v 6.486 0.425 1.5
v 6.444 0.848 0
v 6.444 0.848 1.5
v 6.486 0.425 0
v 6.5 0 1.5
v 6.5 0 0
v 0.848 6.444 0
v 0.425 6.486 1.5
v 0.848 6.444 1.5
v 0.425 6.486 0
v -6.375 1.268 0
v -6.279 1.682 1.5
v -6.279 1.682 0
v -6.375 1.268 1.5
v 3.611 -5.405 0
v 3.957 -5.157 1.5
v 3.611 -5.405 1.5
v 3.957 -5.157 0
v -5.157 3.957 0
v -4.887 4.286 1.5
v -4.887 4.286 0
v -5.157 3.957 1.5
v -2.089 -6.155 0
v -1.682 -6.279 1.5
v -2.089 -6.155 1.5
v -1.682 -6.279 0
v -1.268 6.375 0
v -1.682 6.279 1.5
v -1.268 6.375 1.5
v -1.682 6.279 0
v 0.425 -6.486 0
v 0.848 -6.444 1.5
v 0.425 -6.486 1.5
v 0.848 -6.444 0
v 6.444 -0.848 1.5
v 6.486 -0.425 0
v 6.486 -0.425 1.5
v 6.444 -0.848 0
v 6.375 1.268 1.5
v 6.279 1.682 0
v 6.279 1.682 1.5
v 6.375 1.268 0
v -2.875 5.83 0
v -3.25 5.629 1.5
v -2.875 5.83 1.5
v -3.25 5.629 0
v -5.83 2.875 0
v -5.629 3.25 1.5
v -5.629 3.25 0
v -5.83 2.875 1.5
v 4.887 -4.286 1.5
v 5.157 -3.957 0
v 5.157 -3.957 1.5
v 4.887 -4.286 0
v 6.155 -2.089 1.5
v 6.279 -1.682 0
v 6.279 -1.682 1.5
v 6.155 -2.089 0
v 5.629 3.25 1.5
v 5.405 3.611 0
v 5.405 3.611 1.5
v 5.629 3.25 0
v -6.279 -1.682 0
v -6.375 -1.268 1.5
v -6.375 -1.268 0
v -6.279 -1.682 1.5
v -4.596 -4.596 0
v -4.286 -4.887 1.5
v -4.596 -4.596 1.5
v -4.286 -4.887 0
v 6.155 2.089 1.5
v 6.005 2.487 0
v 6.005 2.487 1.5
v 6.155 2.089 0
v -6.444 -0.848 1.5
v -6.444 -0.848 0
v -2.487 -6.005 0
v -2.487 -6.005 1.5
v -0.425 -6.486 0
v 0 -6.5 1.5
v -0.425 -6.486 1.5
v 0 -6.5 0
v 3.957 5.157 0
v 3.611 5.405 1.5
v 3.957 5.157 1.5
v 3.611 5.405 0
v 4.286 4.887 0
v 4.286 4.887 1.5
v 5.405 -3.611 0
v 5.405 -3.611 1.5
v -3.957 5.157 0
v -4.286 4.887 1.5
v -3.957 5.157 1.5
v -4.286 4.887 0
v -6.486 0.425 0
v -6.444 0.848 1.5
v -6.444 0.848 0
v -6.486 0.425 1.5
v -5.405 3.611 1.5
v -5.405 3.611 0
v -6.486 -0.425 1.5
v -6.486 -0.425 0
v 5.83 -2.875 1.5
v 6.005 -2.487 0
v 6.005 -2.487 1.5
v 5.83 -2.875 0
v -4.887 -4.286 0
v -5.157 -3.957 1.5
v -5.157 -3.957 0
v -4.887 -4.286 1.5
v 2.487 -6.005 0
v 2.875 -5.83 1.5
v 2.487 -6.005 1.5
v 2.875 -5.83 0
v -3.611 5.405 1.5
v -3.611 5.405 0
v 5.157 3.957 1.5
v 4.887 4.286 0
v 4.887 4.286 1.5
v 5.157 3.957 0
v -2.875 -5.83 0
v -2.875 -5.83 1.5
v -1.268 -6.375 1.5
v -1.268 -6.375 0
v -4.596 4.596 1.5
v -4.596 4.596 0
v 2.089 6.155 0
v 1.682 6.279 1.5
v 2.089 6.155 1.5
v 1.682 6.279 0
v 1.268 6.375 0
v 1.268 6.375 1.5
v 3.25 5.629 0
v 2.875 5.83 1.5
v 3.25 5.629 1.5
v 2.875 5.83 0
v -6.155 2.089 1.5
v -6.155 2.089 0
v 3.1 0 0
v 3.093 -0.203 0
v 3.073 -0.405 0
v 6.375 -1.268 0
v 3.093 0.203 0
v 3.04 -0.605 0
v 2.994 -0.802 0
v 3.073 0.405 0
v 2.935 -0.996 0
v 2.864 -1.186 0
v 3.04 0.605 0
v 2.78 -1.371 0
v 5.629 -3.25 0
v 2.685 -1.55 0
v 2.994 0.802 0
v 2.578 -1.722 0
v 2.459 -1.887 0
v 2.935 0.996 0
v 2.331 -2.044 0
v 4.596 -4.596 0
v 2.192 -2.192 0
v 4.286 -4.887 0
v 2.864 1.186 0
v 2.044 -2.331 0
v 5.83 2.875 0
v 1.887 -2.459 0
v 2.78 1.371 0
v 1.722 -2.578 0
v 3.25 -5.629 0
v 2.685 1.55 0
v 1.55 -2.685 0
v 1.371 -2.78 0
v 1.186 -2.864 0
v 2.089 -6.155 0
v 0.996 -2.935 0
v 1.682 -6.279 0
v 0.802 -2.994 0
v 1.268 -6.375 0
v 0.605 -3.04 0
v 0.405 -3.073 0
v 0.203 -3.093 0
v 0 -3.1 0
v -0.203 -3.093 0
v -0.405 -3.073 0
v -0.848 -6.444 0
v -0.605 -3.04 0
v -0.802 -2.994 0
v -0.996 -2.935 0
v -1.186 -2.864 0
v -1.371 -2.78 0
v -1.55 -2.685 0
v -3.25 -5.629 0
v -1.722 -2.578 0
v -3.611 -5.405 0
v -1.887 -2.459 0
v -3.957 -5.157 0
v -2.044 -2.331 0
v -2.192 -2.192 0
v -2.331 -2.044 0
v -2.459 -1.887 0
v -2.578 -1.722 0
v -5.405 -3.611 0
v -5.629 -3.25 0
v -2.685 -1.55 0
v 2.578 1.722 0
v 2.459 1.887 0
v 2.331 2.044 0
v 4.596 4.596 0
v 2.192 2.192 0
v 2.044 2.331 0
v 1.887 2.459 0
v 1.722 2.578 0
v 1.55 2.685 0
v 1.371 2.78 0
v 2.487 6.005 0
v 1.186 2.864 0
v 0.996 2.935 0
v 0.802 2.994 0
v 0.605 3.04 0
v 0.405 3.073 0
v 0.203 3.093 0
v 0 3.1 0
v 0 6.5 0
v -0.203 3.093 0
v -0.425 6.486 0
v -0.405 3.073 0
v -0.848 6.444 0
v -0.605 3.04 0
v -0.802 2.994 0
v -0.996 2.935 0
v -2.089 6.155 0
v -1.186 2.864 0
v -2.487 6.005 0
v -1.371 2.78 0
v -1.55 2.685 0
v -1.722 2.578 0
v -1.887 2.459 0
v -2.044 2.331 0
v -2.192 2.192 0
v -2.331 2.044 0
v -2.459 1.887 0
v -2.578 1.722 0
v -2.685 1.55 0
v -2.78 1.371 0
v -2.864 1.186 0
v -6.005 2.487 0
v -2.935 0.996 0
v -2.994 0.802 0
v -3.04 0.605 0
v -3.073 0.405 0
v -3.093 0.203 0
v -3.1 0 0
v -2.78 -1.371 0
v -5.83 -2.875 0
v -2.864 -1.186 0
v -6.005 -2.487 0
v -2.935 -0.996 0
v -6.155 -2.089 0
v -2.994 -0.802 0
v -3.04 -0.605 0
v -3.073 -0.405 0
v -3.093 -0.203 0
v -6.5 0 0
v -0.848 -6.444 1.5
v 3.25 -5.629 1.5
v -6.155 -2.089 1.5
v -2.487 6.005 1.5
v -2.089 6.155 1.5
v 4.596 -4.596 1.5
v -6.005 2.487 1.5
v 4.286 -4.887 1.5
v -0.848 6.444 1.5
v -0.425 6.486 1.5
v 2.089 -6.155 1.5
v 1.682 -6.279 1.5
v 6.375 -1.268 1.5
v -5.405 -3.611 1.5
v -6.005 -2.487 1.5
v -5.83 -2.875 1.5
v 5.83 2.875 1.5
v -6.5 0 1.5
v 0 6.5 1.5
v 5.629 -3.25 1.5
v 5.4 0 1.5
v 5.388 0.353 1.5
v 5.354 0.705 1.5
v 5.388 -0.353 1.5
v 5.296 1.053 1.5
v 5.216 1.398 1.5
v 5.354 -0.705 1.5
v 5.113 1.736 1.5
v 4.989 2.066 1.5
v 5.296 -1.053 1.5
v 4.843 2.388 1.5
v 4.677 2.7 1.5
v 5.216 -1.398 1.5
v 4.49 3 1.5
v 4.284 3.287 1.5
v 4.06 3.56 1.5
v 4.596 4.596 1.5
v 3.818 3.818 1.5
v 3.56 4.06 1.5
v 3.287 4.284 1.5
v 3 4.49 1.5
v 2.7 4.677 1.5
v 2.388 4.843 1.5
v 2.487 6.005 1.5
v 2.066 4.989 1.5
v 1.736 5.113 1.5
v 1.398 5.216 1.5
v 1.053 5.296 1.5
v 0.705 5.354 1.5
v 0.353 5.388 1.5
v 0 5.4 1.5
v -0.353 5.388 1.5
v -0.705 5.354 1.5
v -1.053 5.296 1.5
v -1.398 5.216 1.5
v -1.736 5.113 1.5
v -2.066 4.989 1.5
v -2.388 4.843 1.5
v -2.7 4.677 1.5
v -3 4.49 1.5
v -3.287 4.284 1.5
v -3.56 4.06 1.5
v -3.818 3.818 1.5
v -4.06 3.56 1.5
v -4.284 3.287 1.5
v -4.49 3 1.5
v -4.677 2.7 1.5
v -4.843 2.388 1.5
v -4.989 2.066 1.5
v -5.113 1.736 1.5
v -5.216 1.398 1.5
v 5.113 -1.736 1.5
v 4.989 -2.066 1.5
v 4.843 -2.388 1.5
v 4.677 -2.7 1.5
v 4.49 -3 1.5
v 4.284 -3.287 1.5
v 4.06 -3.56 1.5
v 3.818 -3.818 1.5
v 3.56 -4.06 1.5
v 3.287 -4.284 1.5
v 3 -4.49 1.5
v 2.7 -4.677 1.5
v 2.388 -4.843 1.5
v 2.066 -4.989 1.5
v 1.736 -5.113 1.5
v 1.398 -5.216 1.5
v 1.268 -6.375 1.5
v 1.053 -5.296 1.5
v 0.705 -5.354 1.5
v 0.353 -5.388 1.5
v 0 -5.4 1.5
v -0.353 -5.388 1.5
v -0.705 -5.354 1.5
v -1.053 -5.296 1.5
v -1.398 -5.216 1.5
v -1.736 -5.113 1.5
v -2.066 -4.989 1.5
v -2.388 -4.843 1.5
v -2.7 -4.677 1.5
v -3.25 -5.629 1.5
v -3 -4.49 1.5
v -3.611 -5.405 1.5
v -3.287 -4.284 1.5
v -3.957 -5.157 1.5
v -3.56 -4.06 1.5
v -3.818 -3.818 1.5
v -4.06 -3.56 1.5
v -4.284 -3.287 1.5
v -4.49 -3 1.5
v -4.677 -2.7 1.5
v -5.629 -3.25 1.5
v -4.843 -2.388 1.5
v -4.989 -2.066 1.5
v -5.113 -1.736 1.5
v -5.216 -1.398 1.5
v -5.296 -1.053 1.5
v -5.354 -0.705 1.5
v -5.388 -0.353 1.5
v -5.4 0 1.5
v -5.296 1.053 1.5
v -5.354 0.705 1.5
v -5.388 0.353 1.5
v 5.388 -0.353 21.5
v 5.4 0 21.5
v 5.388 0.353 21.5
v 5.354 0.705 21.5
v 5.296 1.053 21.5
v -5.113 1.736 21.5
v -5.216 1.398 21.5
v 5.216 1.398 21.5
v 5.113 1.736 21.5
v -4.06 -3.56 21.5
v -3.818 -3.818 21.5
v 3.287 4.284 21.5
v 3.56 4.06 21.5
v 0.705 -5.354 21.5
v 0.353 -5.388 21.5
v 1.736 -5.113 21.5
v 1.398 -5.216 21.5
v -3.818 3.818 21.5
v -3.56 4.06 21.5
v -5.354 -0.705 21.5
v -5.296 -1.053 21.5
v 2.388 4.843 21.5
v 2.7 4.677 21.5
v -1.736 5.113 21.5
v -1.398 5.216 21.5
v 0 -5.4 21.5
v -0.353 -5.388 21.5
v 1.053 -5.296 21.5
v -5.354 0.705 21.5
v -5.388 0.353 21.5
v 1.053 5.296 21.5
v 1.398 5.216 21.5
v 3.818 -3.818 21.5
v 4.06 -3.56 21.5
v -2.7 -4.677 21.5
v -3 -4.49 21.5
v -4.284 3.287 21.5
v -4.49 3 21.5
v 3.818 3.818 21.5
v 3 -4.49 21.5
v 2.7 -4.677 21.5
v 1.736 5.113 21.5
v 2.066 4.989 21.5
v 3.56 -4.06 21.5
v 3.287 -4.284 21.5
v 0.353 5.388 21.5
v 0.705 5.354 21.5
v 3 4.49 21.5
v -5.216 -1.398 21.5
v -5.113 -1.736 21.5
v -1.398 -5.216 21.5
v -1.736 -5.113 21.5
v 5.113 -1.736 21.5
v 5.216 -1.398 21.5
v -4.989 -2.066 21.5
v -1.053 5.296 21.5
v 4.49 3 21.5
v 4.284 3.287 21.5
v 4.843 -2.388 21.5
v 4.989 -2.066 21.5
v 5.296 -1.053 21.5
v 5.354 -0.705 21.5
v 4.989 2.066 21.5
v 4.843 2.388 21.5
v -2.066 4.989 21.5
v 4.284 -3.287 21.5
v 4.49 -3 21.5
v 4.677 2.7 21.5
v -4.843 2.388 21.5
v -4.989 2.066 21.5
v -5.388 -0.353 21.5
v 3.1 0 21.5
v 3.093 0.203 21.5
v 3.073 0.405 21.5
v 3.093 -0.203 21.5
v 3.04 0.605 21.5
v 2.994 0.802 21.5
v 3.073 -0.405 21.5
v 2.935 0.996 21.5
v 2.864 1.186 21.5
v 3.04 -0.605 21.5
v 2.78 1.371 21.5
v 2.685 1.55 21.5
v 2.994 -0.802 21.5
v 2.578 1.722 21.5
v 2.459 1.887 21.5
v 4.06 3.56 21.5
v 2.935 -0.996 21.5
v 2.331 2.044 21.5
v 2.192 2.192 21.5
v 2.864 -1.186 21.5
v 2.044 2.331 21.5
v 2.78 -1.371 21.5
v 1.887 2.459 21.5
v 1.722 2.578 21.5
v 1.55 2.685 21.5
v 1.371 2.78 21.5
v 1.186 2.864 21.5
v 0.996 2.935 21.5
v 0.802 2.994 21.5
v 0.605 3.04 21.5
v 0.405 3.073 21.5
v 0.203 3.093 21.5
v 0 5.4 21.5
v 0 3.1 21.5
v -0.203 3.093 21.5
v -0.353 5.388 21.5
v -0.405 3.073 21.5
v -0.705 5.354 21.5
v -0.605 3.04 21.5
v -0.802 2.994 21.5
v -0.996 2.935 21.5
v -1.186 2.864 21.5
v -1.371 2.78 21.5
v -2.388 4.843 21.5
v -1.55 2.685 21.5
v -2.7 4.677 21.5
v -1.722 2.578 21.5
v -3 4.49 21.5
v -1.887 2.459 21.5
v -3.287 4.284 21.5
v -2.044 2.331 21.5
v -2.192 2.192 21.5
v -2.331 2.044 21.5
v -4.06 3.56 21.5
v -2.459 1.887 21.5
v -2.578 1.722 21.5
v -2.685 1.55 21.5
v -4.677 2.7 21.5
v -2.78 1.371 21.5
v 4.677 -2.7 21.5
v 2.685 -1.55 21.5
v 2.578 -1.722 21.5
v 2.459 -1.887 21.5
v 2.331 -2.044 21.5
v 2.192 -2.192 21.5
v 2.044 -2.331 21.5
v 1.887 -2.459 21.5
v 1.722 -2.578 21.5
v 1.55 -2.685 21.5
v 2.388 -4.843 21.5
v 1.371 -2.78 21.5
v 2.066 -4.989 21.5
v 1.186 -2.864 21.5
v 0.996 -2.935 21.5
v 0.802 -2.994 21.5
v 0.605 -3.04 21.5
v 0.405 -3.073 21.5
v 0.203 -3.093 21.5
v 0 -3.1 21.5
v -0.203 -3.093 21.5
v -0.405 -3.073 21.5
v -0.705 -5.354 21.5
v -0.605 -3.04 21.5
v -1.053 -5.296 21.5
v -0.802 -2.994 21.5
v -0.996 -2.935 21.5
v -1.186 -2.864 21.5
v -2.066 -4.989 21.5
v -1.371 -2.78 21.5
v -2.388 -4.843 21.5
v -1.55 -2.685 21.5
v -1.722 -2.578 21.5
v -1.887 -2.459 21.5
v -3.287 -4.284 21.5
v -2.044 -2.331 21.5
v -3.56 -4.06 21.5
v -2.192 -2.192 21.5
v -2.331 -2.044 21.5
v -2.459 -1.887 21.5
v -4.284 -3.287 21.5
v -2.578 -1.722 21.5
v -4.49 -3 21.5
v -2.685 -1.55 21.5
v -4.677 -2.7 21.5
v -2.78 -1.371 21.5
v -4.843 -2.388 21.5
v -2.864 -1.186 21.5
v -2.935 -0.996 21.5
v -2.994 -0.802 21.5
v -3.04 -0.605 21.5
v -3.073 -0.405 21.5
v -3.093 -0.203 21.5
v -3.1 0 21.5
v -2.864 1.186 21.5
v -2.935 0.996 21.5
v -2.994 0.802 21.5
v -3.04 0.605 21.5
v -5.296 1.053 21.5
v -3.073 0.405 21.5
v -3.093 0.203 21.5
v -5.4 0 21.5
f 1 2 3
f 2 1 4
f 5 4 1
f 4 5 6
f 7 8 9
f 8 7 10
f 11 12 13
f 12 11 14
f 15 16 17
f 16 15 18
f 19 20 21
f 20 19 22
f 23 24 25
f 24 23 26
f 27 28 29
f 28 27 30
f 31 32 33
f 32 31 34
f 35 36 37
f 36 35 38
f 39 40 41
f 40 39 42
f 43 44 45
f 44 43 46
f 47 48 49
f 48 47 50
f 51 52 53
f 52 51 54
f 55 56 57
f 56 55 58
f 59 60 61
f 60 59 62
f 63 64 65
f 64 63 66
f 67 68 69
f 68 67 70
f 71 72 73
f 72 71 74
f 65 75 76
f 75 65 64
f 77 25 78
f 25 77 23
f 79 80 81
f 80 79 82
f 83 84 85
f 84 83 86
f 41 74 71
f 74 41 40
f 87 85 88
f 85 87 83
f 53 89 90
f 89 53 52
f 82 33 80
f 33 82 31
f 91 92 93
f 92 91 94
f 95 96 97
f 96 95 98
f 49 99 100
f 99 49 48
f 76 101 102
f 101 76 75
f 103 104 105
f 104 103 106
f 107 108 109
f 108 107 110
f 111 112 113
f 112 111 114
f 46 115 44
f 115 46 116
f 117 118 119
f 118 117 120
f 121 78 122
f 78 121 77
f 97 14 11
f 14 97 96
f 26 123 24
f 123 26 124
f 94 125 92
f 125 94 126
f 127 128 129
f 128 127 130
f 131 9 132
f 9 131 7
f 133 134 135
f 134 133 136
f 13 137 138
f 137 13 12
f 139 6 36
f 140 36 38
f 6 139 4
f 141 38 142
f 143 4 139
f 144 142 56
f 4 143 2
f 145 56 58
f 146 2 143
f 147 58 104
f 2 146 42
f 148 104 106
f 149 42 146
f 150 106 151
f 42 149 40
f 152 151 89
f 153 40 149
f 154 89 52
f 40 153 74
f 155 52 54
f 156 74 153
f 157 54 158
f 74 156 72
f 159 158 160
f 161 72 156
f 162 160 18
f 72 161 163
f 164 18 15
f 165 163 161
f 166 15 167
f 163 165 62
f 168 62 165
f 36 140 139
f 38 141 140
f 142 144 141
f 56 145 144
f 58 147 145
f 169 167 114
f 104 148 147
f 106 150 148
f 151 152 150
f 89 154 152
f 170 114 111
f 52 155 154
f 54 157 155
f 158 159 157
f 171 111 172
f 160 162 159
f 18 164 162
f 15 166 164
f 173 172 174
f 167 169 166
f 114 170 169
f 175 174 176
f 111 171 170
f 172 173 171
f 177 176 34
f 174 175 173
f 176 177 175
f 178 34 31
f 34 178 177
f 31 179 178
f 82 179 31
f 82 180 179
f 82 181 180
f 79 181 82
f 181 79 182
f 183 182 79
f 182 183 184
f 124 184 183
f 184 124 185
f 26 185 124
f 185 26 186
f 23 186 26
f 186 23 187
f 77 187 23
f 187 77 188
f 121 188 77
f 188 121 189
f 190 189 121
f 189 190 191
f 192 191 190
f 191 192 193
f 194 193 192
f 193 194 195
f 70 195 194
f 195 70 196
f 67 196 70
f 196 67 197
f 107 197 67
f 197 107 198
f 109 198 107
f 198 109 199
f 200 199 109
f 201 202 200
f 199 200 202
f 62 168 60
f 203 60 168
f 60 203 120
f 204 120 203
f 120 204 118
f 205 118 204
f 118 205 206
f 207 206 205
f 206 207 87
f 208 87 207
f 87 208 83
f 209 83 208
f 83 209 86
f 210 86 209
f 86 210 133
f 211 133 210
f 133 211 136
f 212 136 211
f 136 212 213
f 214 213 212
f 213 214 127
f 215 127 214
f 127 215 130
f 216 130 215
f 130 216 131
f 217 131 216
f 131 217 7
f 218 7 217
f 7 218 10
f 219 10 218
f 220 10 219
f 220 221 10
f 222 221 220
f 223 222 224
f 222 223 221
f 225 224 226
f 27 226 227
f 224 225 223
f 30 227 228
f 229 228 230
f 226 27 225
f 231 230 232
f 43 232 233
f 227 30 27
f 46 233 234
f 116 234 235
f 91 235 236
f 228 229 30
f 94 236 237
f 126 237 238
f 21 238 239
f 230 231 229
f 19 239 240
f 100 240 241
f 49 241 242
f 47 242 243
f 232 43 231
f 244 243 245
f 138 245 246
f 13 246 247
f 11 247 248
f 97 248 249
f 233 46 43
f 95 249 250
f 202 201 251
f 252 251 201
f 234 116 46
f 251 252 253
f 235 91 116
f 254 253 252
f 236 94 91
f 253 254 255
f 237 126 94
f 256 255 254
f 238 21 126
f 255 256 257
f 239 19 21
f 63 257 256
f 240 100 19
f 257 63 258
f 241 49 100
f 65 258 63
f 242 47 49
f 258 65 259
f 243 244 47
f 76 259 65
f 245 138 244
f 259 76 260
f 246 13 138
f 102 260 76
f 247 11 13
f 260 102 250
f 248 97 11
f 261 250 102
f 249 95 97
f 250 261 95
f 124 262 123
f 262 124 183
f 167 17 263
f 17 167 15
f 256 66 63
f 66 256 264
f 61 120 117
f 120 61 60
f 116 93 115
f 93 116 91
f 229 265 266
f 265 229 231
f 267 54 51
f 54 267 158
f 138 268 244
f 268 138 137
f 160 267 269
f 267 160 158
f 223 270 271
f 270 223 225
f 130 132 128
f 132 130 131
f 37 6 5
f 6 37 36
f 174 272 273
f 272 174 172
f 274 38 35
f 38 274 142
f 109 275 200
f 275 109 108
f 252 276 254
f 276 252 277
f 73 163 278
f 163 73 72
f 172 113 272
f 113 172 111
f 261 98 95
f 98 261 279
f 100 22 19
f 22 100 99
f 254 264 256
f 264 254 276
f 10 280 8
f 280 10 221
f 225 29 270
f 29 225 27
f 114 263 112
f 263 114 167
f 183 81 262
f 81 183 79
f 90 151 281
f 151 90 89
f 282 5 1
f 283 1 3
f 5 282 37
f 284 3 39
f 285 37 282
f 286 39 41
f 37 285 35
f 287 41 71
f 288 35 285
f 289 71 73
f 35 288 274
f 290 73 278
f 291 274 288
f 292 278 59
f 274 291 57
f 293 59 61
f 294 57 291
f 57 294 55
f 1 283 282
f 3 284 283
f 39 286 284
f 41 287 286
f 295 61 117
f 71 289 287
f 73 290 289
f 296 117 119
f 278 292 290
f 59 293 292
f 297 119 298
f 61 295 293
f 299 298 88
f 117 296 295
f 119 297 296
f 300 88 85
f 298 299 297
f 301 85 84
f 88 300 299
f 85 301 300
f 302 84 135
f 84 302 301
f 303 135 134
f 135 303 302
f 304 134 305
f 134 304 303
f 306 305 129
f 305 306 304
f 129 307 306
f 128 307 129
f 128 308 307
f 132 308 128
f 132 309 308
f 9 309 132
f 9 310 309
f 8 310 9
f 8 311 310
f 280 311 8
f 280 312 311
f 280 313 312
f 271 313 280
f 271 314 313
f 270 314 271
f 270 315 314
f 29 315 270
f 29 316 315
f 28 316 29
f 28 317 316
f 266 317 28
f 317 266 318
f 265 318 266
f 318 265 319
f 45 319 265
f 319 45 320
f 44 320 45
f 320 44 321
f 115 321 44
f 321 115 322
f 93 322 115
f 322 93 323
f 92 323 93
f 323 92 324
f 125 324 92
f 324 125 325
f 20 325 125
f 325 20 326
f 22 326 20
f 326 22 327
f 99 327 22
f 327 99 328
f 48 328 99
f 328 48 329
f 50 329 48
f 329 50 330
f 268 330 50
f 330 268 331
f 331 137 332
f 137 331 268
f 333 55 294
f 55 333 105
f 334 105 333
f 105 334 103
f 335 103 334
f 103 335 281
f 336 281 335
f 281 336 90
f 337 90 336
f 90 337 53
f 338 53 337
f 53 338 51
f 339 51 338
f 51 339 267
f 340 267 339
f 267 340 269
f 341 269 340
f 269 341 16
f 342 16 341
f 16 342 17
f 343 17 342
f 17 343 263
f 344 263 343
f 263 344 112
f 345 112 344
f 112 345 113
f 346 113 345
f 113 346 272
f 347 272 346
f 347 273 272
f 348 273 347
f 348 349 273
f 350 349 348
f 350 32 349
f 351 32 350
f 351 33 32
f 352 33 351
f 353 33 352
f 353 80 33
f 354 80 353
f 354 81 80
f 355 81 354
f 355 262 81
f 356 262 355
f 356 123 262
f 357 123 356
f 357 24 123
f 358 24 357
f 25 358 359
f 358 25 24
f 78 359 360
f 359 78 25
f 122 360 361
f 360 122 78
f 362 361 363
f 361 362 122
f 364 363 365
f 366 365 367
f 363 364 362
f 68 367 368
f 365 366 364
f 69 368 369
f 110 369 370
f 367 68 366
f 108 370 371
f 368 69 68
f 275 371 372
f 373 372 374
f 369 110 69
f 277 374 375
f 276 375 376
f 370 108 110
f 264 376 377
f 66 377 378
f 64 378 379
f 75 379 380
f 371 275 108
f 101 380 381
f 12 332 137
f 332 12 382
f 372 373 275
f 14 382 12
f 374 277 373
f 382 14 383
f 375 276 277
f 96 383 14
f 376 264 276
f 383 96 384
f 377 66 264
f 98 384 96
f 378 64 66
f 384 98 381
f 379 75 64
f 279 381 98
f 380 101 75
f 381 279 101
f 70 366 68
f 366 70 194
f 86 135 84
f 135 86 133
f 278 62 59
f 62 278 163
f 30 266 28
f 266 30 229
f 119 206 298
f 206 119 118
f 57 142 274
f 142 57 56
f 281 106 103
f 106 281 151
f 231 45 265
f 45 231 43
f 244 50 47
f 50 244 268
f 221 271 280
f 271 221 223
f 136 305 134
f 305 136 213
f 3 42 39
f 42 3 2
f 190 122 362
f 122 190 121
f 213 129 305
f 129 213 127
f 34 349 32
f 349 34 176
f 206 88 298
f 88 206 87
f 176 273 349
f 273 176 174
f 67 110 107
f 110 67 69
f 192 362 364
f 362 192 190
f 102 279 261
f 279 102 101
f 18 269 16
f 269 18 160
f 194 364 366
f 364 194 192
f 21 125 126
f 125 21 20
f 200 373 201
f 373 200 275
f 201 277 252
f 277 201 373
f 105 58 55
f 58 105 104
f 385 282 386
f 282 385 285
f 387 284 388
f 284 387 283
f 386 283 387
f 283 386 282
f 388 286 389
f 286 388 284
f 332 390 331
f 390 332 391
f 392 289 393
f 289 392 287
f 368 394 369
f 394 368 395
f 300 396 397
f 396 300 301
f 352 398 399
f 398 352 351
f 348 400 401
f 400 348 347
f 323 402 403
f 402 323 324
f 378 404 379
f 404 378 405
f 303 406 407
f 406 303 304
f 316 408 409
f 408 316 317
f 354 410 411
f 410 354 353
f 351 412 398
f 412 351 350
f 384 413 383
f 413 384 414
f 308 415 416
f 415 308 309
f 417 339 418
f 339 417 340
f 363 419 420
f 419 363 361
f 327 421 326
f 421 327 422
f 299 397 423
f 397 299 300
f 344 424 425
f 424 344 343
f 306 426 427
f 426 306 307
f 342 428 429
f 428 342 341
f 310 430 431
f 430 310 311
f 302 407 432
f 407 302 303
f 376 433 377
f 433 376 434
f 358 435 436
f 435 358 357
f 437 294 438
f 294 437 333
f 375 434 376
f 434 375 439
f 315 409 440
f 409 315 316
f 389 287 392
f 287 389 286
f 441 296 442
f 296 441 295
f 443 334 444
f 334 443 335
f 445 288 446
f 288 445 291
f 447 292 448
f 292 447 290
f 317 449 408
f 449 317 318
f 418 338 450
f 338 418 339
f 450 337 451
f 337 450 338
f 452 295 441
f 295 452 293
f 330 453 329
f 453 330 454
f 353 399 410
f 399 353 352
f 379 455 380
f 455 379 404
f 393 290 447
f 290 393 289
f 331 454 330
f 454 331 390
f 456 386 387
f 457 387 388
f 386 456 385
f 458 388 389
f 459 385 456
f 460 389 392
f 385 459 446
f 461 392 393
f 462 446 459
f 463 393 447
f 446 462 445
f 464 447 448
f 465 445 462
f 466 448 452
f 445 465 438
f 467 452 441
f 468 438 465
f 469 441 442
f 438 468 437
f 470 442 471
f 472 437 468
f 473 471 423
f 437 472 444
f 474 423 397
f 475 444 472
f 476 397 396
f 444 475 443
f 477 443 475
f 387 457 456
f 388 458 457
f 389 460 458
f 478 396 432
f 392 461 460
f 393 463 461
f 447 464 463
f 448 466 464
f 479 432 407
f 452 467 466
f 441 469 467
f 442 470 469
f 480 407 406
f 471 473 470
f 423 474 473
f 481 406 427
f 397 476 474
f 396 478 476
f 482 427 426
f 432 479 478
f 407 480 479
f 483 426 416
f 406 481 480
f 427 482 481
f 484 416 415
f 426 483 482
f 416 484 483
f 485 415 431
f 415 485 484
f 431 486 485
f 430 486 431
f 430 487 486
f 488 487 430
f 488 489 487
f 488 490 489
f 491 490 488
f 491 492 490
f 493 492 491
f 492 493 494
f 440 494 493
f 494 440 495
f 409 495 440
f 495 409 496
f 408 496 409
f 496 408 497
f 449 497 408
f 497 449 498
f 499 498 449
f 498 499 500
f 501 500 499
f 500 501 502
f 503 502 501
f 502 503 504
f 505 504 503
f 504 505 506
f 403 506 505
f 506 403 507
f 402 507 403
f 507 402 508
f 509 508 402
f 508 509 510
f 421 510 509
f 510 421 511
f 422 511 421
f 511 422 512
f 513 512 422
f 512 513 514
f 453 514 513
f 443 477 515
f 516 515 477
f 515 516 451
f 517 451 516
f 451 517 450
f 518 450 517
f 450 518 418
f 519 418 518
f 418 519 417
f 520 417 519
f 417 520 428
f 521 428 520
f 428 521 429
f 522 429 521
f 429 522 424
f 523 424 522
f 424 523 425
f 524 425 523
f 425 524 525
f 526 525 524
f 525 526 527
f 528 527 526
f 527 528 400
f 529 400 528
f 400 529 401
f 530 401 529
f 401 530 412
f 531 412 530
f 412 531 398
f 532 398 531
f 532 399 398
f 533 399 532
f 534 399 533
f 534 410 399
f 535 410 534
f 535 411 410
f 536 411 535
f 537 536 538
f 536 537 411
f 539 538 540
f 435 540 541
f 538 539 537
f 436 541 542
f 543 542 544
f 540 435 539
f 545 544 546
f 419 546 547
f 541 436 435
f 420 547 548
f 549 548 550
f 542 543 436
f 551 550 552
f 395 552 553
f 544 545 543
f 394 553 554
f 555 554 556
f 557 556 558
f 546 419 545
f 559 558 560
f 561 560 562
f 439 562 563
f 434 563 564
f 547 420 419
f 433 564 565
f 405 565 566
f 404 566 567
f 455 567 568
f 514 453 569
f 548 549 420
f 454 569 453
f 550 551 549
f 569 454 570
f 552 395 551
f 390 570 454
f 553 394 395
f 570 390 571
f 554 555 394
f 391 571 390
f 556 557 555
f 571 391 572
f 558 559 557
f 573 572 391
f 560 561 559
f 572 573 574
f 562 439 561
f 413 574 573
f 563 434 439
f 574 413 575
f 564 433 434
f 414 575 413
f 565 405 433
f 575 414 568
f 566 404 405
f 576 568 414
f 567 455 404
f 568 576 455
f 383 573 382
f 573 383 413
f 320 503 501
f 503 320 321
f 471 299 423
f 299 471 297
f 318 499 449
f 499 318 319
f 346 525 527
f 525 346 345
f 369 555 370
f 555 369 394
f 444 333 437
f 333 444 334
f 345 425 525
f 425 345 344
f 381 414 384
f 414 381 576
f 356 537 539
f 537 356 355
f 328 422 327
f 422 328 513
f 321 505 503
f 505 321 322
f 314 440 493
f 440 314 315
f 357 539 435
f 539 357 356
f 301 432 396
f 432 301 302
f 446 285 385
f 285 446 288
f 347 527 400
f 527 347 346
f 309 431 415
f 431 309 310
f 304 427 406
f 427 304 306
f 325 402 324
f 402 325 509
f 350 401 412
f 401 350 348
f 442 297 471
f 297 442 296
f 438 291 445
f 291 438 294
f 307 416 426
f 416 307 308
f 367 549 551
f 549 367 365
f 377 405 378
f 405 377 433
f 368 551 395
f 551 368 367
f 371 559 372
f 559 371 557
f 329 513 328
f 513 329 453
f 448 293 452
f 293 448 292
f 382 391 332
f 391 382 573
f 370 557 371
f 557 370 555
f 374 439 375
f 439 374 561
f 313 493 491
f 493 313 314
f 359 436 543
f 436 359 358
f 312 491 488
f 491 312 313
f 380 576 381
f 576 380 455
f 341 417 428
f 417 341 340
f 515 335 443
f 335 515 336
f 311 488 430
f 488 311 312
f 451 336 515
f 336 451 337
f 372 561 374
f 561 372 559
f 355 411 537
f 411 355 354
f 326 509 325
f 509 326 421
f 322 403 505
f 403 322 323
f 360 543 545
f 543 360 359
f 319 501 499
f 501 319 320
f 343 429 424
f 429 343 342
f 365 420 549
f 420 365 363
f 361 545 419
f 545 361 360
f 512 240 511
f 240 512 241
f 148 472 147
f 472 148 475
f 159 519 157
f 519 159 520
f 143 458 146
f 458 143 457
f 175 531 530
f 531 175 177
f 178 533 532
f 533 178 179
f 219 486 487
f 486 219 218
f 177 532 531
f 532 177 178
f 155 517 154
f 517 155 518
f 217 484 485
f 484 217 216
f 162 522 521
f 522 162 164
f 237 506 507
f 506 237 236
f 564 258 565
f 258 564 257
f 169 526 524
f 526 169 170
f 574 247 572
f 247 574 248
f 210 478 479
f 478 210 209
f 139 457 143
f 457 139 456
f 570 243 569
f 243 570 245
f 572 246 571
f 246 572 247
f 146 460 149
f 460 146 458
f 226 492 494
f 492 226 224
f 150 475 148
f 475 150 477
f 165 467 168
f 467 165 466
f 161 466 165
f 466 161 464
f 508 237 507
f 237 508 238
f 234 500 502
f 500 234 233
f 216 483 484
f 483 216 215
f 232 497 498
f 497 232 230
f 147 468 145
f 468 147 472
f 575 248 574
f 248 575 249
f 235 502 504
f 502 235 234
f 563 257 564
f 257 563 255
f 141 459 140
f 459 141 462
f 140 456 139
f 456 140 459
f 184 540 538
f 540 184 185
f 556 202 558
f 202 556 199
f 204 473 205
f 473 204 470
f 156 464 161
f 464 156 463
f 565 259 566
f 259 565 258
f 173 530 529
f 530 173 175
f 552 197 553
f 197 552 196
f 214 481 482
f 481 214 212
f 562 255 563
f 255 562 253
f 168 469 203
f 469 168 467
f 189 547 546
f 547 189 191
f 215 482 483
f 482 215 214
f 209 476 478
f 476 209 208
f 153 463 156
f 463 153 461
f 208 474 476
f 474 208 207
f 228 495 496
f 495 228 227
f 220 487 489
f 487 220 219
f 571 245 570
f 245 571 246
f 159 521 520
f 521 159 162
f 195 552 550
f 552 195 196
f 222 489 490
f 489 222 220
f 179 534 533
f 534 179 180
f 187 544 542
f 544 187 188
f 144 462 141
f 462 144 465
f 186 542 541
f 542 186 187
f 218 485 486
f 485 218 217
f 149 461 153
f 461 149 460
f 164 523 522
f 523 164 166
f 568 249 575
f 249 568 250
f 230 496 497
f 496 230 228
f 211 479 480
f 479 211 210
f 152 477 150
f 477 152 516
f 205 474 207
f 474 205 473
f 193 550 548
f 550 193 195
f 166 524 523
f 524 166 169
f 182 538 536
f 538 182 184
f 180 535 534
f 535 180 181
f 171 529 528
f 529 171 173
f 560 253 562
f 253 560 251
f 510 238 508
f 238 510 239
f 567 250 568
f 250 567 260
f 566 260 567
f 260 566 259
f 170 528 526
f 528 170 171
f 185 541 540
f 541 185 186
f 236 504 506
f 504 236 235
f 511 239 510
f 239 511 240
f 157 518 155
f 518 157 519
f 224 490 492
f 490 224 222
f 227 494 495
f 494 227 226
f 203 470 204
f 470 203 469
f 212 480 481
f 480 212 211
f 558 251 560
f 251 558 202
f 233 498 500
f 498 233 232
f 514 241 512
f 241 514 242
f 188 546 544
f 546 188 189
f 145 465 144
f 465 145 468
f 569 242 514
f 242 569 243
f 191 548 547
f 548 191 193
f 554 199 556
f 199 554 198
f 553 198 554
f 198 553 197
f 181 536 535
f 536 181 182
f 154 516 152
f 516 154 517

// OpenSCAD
// PCR tube adapter sleeve: fits 0.2 mL tubes into 1.5 mL rack holes
// Print orientation: collar on bed (z = 0), sleeve body rises to z = 21.5

// ---------- Parameters ----------
collar_d        = 13;    // collar outer diameter
collar_h        = 1.5;   // collar thickness (z = 0 to 1.5)
sleeve_od       = 10.8;  // sleeve body outer diameter
sleeve_top_z    = 21.5;  // top of sleeve body
bore_d          = 6.2;   // through-bore diameter
eps             = 0.5;   // cutter overshoot past faces

$fn = 96;

// ---------- Model ----------
difference() {
    union() {
        // Collar
        cylinder(d = collar_d, h = collar_h);
        // Sleeve body (overlaps collar slightly for a clean union)
        translate([0, 0, collar_h - 0.01])
            cylinder(d = sleeve_od, h = sleeve_top_z - collar_h + 0.01);
    }
    // Full-height bore
    translate([0, 0, -eps])
        cylinder(d = bore_d, h = sleeve_top_z + 2 * eps);
}
